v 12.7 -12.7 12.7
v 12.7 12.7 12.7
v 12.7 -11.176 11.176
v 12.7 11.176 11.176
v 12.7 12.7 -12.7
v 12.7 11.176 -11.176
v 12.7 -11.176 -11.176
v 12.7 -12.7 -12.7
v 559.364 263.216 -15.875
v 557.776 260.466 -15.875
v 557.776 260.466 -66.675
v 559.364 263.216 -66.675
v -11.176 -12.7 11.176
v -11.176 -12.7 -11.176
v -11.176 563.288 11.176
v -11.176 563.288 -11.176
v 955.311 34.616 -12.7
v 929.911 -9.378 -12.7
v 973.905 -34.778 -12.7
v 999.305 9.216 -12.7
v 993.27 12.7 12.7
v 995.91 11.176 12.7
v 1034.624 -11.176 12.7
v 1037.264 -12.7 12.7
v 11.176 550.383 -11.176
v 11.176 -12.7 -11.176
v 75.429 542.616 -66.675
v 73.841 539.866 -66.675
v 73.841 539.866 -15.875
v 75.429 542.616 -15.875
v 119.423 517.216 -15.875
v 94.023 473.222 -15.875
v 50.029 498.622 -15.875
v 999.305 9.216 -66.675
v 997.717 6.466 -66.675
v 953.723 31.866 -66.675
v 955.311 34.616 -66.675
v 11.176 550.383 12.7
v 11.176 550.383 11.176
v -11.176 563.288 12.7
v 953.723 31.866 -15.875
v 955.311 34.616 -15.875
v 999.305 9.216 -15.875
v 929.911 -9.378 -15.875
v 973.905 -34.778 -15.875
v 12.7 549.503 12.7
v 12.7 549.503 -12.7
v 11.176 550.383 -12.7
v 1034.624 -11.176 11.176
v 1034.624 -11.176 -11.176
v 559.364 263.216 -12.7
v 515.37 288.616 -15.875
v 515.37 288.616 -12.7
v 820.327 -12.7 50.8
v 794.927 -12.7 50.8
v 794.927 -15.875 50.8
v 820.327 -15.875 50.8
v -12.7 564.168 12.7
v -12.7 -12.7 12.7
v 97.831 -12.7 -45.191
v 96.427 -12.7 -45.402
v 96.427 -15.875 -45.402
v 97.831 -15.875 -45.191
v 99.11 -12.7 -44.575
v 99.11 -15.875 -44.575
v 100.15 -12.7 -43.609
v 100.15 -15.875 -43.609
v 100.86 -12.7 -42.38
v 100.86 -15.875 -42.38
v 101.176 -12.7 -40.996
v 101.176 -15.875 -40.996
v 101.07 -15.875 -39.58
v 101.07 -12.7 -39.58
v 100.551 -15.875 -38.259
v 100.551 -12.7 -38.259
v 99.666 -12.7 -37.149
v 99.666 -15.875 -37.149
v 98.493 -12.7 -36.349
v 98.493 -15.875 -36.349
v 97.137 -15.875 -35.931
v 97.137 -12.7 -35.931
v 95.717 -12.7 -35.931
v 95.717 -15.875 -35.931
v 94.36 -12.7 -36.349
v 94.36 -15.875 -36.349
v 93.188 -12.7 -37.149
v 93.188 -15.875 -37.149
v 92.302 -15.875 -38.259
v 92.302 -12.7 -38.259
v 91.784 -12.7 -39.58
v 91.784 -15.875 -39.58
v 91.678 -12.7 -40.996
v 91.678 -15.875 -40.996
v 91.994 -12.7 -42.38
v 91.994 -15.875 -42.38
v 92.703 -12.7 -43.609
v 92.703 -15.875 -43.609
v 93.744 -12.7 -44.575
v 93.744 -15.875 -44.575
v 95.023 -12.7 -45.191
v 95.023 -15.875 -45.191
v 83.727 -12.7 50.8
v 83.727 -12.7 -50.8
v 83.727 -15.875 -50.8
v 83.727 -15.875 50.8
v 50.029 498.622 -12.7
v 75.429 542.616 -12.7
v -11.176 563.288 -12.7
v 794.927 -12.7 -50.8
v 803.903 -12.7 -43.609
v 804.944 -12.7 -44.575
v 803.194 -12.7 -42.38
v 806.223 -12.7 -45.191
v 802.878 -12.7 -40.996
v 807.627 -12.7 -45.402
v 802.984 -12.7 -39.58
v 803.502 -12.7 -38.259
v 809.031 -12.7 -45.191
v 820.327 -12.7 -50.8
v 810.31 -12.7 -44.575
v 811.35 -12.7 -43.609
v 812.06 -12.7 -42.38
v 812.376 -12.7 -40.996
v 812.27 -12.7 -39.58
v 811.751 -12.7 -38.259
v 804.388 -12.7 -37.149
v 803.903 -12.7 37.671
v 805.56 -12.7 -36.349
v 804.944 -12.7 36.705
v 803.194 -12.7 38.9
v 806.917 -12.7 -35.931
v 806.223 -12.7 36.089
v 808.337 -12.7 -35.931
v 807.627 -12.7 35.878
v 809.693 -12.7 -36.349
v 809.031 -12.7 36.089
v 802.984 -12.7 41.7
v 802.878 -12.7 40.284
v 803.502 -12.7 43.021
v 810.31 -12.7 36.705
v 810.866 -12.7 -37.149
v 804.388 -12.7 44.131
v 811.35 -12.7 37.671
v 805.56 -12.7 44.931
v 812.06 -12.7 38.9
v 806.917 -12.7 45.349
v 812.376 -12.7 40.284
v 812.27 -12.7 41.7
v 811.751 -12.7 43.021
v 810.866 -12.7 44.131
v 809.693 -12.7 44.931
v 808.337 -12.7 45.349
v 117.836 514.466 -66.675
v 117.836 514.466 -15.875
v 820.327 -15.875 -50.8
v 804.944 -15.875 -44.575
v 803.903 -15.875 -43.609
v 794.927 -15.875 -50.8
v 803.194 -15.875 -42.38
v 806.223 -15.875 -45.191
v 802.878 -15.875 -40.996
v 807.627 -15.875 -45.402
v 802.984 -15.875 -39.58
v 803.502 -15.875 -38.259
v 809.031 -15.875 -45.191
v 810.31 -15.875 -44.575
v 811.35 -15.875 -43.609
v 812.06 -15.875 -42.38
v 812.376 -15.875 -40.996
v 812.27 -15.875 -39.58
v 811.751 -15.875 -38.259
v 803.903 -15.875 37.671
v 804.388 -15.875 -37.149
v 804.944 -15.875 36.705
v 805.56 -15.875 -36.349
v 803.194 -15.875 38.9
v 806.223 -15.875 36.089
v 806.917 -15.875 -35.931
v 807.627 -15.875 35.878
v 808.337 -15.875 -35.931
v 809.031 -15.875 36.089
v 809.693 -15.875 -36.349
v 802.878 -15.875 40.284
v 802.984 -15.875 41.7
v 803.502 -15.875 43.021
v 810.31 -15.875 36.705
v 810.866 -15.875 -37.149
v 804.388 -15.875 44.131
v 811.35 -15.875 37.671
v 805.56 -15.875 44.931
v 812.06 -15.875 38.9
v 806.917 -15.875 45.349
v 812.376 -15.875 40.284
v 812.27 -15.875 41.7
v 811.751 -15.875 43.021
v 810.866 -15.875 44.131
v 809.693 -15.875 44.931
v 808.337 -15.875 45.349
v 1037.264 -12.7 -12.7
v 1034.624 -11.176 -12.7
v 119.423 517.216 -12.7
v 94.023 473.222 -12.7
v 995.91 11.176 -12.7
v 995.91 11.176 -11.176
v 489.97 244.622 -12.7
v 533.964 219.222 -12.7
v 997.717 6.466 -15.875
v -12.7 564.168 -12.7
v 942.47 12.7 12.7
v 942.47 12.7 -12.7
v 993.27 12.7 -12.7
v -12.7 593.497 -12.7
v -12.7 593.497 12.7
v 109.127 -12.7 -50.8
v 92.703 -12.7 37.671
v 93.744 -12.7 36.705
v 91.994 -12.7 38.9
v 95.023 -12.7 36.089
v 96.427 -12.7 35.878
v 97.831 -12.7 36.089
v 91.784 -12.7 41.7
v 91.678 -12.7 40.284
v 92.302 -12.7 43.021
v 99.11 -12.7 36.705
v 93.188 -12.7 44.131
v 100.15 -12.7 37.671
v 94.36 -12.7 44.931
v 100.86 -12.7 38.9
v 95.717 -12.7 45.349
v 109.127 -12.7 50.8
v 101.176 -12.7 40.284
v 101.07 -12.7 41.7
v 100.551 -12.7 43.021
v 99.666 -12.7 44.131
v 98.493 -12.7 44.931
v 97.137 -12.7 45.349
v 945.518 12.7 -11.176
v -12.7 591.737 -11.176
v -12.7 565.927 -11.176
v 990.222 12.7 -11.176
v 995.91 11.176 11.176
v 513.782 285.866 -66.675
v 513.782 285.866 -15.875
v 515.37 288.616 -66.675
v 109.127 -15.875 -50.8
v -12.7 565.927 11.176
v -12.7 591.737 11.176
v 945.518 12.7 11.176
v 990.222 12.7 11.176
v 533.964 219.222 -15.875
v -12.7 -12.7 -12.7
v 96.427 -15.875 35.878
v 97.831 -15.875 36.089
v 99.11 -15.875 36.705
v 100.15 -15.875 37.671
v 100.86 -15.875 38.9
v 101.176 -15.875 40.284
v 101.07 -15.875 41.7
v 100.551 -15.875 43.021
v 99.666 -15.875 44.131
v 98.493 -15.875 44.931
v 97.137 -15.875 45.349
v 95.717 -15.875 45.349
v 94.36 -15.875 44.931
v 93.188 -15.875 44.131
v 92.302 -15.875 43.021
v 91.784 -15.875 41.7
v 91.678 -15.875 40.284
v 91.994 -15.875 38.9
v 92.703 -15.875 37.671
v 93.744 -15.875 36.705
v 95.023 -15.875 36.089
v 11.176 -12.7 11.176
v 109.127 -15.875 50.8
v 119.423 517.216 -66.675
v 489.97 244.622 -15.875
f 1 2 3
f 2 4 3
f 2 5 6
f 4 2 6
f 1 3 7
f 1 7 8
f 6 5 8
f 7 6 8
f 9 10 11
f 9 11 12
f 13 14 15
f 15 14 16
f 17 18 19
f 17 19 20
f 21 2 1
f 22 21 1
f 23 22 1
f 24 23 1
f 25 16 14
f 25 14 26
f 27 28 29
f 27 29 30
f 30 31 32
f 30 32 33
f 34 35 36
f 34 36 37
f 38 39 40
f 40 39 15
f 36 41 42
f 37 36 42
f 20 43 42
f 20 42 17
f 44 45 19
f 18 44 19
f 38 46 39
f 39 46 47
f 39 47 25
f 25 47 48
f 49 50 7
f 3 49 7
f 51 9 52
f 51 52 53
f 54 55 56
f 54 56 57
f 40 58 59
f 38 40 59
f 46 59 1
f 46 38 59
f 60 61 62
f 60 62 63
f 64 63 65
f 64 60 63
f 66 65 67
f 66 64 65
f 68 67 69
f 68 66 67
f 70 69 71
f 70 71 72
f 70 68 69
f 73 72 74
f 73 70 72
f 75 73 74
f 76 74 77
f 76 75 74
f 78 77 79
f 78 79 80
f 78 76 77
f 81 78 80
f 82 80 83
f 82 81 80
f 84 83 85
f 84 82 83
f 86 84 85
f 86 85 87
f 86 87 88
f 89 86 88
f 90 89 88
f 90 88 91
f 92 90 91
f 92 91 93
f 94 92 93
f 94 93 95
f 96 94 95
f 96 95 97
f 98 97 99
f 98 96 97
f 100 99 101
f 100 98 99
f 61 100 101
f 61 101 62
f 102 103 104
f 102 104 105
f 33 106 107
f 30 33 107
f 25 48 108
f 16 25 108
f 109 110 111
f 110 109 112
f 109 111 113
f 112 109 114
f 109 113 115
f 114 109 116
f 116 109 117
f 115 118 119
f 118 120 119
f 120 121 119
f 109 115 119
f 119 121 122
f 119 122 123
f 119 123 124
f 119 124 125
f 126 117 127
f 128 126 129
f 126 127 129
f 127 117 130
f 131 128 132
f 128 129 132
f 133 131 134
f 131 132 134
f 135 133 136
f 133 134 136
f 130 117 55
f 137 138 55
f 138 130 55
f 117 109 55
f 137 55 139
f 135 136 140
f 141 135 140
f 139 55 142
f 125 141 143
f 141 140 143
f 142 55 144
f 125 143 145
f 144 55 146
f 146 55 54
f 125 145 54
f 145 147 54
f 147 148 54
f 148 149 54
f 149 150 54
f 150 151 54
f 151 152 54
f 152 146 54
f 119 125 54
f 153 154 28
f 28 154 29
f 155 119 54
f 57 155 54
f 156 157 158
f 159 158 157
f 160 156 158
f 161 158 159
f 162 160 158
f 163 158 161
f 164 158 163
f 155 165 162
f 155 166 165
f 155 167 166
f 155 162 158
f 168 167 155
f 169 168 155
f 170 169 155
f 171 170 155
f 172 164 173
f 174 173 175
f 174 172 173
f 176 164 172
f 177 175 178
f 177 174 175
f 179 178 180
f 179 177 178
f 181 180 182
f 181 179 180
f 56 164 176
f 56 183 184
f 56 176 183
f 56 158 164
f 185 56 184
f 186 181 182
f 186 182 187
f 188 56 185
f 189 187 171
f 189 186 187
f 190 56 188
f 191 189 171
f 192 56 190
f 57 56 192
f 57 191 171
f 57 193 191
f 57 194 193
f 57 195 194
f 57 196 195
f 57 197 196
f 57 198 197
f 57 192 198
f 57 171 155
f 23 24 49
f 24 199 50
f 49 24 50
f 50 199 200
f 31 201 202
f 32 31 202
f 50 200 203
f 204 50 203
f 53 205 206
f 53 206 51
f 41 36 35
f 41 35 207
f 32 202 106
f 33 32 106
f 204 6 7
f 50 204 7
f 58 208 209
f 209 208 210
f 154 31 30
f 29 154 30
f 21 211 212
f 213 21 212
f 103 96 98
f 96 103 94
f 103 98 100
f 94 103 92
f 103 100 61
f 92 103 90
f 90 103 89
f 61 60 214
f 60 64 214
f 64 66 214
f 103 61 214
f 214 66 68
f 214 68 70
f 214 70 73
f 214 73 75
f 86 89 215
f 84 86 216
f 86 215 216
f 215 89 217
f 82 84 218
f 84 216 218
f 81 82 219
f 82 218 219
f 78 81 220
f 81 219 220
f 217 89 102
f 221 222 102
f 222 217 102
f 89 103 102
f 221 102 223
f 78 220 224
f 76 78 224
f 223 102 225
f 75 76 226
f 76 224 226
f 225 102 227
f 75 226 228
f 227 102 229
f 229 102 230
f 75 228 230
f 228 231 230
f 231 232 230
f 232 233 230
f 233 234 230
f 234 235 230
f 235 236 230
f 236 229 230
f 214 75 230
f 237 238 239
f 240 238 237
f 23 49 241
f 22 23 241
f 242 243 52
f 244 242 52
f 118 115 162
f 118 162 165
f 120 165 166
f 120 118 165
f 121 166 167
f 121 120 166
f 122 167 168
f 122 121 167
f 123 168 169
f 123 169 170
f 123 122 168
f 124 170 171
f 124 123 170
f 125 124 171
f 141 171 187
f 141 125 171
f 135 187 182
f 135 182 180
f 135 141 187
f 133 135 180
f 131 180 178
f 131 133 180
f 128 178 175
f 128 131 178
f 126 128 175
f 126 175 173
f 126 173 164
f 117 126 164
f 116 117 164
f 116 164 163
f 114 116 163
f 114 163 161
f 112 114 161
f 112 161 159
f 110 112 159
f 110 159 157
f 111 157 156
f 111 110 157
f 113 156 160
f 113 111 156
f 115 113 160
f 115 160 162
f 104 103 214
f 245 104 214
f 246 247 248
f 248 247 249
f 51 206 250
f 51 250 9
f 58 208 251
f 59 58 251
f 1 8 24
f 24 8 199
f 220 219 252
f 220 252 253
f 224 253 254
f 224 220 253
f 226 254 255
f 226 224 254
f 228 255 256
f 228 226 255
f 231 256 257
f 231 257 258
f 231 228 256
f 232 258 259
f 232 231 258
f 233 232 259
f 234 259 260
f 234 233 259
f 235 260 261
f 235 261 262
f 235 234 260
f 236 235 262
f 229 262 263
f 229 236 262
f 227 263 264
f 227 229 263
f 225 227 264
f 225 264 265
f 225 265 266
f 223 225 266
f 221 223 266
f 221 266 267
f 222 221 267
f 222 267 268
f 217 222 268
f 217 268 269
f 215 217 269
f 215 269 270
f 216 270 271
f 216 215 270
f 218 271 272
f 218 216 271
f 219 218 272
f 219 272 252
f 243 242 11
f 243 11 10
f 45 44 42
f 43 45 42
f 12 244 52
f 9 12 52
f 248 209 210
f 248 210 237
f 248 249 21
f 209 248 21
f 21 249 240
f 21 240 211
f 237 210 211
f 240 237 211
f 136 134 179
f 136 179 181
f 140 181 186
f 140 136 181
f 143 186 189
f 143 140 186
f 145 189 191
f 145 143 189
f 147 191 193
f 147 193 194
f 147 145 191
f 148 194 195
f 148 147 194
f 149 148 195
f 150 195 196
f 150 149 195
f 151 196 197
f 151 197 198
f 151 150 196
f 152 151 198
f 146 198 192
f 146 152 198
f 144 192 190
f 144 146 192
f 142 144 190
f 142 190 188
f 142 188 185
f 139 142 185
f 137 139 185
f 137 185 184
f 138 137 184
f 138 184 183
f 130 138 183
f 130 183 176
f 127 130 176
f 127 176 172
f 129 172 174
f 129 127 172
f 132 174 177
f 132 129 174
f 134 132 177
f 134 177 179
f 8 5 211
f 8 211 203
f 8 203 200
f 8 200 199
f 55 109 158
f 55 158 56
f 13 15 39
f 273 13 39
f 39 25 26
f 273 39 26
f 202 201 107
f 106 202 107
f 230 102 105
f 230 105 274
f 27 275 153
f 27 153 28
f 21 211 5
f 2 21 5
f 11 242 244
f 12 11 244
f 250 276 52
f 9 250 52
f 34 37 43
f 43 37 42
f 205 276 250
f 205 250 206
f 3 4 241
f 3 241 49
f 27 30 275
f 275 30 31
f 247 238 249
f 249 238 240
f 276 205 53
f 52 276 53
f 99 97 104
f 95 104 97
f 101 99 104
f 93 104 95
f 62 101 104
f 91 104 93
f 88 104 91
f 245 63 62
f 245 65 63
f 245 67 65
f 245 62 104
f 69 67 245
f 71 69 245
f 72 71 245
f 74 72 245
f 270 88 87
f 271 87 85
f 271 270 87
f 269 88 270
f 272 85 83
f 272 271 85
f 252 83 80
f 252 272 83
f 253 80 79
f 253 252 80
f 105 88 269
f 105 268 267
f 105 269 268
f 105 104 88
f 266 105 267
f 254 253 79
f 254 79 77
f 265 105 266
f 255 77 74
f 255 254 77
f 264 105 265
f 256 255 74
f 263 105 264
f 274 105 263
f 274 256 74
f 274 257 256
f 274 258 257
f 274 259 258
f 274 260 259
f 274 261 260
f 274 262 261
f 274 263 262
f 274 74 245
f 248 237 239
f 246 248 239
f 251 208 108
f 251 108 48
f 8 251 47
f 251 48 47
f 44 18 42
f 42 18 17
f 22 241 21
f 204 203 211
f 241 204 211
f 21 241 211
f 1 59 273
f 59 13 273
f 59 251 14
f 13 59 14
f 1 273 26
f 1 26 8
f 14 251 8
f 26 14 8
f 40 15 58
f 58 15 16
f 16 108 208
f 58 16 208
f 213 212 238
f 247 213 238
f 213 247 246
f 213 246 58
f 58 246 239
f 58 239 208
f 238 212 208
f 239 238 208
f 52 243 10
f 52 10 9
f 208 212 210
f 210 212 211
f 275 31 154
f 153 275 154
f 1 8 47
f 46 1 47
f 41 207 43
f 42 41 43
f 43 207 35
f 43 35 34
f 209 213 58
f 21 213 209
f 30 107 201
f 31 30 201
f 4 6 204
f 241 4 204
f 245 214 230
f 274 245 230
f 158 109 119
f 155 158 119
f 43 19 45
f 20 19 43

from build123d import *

# Parameters (mm, degrees)
RECTANGULAR_START                    = -12.7
RECTANGULAR_TUBE_1X1X0_060_1_DEPTH   = 25.4
RECTANGULAR_TUBE_1X1X0_060_1_2_DEPTH = 1.524
RECTANGULAR_START_2                  = 11.176
RECTANGULAR_TUBE_1X1X0_060_1_3_DEPTH = 1.524
RECTANGULAR_TUBE_1X1X0_060_1_4_DEPTH = 25.4
RECTANGULAR_TUBE_1X1X0_060_1_5_DEPTH = 1.524
RECTANGULAR_TUBE_1X1X0_060_1_6_DEPTH = 1.524
RECTANGULAR_TUBE_1X1X0_060_1_7_DEPTH = 25.4
RECTANGULAR_TUBE_1X1X0_060_1_8_DEPTH = 1.524
RECTANGULAR_TUBE_1X1X0_060_1_9_DEPTH = 1.524
SKETCH3_W                            = 25.4
SKETCH3_H                            = 101.6
SKETCH3_R                            = 4.7625
BOSS_EXTRUDE1_DEPTH                  = 3.175
LPATTERN1_COUNT                      = 2
LPATTERN1_PITCH                      = 711.2
BOSS_EXTRUDE2_DEPTH                  = 3.175
BOSS_EXTRUDE3_DEPTH                  = 50.8
LPATTERN2_START                      = 810.015529895
LPATTERN2_OUTLINE_W                  = 3.175
LPATTERN2_OUTLINE_H                  = 50.8
LPATTERN2_DEPTH                      = 50.8
LPATTERN2_START_2                    = 302.015529895
LPATTERN2_2_OUTLINE_W                = 3.175
LPATTERN2_2_OUTLINE_H                = 50.8
LPATTERN2_2_DEPTH                    = 50.8
LPATTERN2_3_OUTLINE_W                = 50.8
LPATTERN2_3_OUTLINE_H                = 3.175
LPATTERN2_3_DEPTH                    = 50.8
LPATTERN2_4_OUTLINE_W                = 50.8
LPATTERN2_4_OUTLINE_H                = 3.175
LPATTERN2_4_DEPTH                    = 50.8


# Read off the part's stored shape, not the designer's step: Rectangular tube 1X1X0_060(1), LPattern2
with BuildPart() as part:
    # Rectangular tube 1X1X0_060(1) outline → Rectangular tube 1X1X0_060(1) (new body)
    with BuildSketch(Plane.XY.offset(RECTANGULAR_START)):
        Polygon((942.469991269, 12.7), (945.517991269, 12.7), (-12.7, 565.927415202), (-12.7, 564.167651581), align=None)
        Polygon((-12.7, 591.737281636), (990.221991269, 12.7), (993.269991269, 12.7), (-12.7, 593.497045256), align=None)
    extrude(amount=RECTANGULAR_TUBE_1X1X0_060_1_DEPTH)

    # Rectangular tube 1X1X0_060_1 2 outline → Rectangular tube 1X1X0_060_1 2 (add)
    with BuildSketch(Plane.XY.offset(RECTANGULAR_START)):
        Polygon((-12.7, 565.927415202), (945.517991269, 12.7), (990.221991269, 12.7), (-12.7, 591.737281636), align=None)
    extrude(amount=RECTANGULAR_TUBE_1X1X0_060_1_2_DEPTH)

    # Rectangular tube 1X1X0_060_1 3 outline → Rectangular tube 1X1X0_060_1 3 (add)
    with BuildSketch(Plane.XY.offset(RECTANGULAR_START_2)):
        Polygon((-12.7, 565.927415202), (945.517991269, 12.7), (990.221991269, 12.7), (-12.7, 591.737281636), align=None)
    extrude(amount=RECTANGULAR_TUBE_1X1X0_060_1_3_DEPTH)


with BuildPart() as body_2:
    # Rectangular tube 1X1X0_060_1 4 outline → Rectangular tube 1X1X0_060_1 4 (new body)
    with BuildSketch(Plane.XY.offset(RECTANGULAR_START)):
        Polygon((12.7, 549.502954744), (11.176, 550.382836554), (11.176, -12.7), (12.7, -12.7), align=None)
        Polygon((-11.176, -12.7), (-11.176, 563.287769771), (-12.7, 564.167651581), (-12.7, -12.7), align=None)
    extrude(amount=RECTANGULAR_TUBE_1X1X0_060_1_4_DEPTH)

    # Rectangular tube 1X1X0_060_1 5 outline → Rectangular tube 1X1X0_060_1 5 (add)
    with BuildSketch(Plane.XY.offset(RECTANGULAR_START)):
        Polygon((11.176, -12.7), (11.176, 550.382836554), (-11.176, 563.287769771), (-11.176, -12.7), align=None)
    extrude(amount=RECTANGULAR_TUBE_1X1X0_060_1_5_DEPTH)

    # Rectangular tube 1X1X0_060_1 6 outline → Rectangular tube 1X1X0_060_1 6 (add)
    with BuildSketch(Plane.XY.offset(RECTANGULAR_START_2)):
        Polygon((11.176, -12.7), (11.176, 550.382836554), (-11.176, 563.287769771), (-11.176, -12.7), align=None)
    extrude(amount=RECTANGULAR_TUBE_1X1X0_060_1_6_DEPTH)


with BuildPart() as body_3:
    # Rectangular tube 1X1X0_060_1 7 outline → Rectangular tube 1X1X0_060_1 7 (new body)
    with BuildSketch(Plane.XY.offset(RECTANGULAR_START)):
        Polygon((12.7, 12.7), (12.7, 11.176), (995.9096367, 11.176), (993.269991269, 12.7), align=None)
        Polygon((1034.624436351, -11.176), (12.7, -11.176), (12.7, -12.7), (1037.264081782, -12.7), align=None)
    extrude(amount=RECTANGULAR_TUBE_1X1X0_060_1_7_DEPTH)

    # Rectangular tube 1X1X0_060_1 8 outline → Rectangular tube 1X1X0_060_1 8 (add)
    with BuildSketch(Plane.XY.offset(RECTANGULAR_START)):
        Polygon((995.9096367, 11.176), (12.7, 11.176), (12.7, -11.176), (1034.624436351, -11.176), align=None)
    extrude(amount=RECTANGULAR_TUBE_1X1X0_060_1_8_DEPTH)

    # Rectangular tube 1X1X0_060_1 9 outline → Rectangular tube 1X1X0_060_1 9 (add)
    with BuildSketch(Plane.XY.offset(RECTANGULAR_START_2)):
        Polygon((995.9096367, 11.176), (12.7, 11.176), (12.7, -11.176), (1034.624436351, -11.176), align=None)
    extrude(amount=RECTANGULAR_TUBE_1X1X0_060_1_9_DEPTH)


with BuildPart() as body_4:
    # Sketch3 → Boss-Extrude1 (new body)
    with BuildSketch(Plane.XZ.offset(12.7)):
        with Locations((96.426843049, 0)):
            Rectangle(SKETCH3_W, SKETCH3_H)
        with Locations(Location((96.426843049, 40.64, 0), (0, 0, 270))):
            Circle(SKETCH3_R, mode=Mode.SUBTRACT)
        with Locations(Location((96.426843049, -40.64, 0), (0, 0, 270))):
            Circle(SKETCH3_R, mode=Mode.SUBTRACT)
    boss_extrude1 = extrude(amount=BOSS_EXTRUDE1_DEPTH)


with BuildPart() as lpattern1_1:
    # LPattern1: Boss-Extrude1 ×2
    with Locations(*[(i * LPATTERN1_PITCH, 0, 0) for i in range(1, LPATTERN1_COUNT)]):
        add(boss_extrude1)


with BuildPart() as body_6:
    # Sketch5 → Boss-Extrude2 (new body)
    with BuildSketch(Plane(origin=(0, 0, -12.7), x_dir=(-1, 0, 0), z_dir=(0, 0, -1))):
        Polygon((-75.428975235, 542.615757681), (-119.423065748, 517.215757681), (-94.023065748, 473.221667168), (-50.028975235, 498.621667168), align=None)
    extrude(amount=BOSS_EXTRUDE2_DEPTH)


with BuildPart() as body_7:
    # Sketch6 → Boss-Extrude3 (new body)
    with BuildSketch(Plane(origin=(0, 0, -15.875), x_dir=(-1, 0, 0), z_dir=(0, 0, -1))):
        Polygon((-75.428975235, 542.615757681), (-119.423065748, 517.215757681), (-117.835565748, 514.466127024), (-73.841475235, 539.866127024), align=None)
    extrude(amount=BOSS_EXTRUDE3_DEPTH)


with BuildPart() as body_8:
    # LPattern2 outline → LPattern2 (new body)
    with BuildSketch(Plane(origin=(0, 0, 0), x_dir=(0.500000000000108, 0.8660254037843762, 0), z_dir=(0.8660254037843762, -0.5000000000001082, 0)).offset(LPATTERN2_START)):
        with Locations((506.046018263, -41.275)):
            Rectangle(LPATTERN2_OUTLINE_W, LPATTERN2_OUTLINE_H)
    extrude(amount=LPATTERN2_DEPTH)


with BuildPart() as body_9:
    # LPattern2 2 outline → LPattern2 2 (new body)
    with BuildSketch(Plane(origin=(0, 0, 0), x_dir=(0.500000000000108, 0.8660254037843762, 0), z_dir=(0.8660254037843762, -0.5000000000001082, 0)).offset(LPATTERN2_START_2)):
        with Locations((506.046018263, -41.275)):
            Rectangle(LPATTERN2_2_OUTLINE_W, LPATTERN2_2_OUTLINE_H)
    extrude(amount=LPATTERN2_2_DEPTH)


with BuildPart() as body_10:
    # LPattern2 3 outline → LPattern2 3 (new body)
    with BuildSketch(Plane(origin=(0, 0, 0), x_dir=(0.5000000000000003, 0.8660254037844385, 0), z_dir=(0.8660254037844385, -0.5000000000000003, 0)).offset(LPATTERN2_START)):
        with Locations((482.233518263, -14.2875)):
            Rectangle(LPATTERN2_3_OUTLINE_W, LPATTERN2_3_OUTLINE_H)
    extrude(amount=LPATTERN2_3_DEPTH)


with BuildPart() as body_11:
    # LPattern2 4 outline → LPattern2 4 (new body)
    with BuildSketch(Plane(origin=(0, 0, 0), x_dir=(0.5000000000000003, 0.8660254037844385, 0), z_dir=(0.8660254037844385, -0.5000000000000003, 0)).offset(LPATTERN2_START_2)):
        with Locations((482.233518263, -14.2875)):
            Rectangle(LPATTERN2_4_OUTLINE_W, LPATTERN2_4_OUTLINE_H)
    extrude(amount=LPATTERN2_4_DEPTH)


solid = Compound([part.part, body_2.part, body_3.part, body_4.part, lpattern1_1.part, body_6.part, body_7.part, body_8.part, body_9.part, body_10.part, body_11.part])
